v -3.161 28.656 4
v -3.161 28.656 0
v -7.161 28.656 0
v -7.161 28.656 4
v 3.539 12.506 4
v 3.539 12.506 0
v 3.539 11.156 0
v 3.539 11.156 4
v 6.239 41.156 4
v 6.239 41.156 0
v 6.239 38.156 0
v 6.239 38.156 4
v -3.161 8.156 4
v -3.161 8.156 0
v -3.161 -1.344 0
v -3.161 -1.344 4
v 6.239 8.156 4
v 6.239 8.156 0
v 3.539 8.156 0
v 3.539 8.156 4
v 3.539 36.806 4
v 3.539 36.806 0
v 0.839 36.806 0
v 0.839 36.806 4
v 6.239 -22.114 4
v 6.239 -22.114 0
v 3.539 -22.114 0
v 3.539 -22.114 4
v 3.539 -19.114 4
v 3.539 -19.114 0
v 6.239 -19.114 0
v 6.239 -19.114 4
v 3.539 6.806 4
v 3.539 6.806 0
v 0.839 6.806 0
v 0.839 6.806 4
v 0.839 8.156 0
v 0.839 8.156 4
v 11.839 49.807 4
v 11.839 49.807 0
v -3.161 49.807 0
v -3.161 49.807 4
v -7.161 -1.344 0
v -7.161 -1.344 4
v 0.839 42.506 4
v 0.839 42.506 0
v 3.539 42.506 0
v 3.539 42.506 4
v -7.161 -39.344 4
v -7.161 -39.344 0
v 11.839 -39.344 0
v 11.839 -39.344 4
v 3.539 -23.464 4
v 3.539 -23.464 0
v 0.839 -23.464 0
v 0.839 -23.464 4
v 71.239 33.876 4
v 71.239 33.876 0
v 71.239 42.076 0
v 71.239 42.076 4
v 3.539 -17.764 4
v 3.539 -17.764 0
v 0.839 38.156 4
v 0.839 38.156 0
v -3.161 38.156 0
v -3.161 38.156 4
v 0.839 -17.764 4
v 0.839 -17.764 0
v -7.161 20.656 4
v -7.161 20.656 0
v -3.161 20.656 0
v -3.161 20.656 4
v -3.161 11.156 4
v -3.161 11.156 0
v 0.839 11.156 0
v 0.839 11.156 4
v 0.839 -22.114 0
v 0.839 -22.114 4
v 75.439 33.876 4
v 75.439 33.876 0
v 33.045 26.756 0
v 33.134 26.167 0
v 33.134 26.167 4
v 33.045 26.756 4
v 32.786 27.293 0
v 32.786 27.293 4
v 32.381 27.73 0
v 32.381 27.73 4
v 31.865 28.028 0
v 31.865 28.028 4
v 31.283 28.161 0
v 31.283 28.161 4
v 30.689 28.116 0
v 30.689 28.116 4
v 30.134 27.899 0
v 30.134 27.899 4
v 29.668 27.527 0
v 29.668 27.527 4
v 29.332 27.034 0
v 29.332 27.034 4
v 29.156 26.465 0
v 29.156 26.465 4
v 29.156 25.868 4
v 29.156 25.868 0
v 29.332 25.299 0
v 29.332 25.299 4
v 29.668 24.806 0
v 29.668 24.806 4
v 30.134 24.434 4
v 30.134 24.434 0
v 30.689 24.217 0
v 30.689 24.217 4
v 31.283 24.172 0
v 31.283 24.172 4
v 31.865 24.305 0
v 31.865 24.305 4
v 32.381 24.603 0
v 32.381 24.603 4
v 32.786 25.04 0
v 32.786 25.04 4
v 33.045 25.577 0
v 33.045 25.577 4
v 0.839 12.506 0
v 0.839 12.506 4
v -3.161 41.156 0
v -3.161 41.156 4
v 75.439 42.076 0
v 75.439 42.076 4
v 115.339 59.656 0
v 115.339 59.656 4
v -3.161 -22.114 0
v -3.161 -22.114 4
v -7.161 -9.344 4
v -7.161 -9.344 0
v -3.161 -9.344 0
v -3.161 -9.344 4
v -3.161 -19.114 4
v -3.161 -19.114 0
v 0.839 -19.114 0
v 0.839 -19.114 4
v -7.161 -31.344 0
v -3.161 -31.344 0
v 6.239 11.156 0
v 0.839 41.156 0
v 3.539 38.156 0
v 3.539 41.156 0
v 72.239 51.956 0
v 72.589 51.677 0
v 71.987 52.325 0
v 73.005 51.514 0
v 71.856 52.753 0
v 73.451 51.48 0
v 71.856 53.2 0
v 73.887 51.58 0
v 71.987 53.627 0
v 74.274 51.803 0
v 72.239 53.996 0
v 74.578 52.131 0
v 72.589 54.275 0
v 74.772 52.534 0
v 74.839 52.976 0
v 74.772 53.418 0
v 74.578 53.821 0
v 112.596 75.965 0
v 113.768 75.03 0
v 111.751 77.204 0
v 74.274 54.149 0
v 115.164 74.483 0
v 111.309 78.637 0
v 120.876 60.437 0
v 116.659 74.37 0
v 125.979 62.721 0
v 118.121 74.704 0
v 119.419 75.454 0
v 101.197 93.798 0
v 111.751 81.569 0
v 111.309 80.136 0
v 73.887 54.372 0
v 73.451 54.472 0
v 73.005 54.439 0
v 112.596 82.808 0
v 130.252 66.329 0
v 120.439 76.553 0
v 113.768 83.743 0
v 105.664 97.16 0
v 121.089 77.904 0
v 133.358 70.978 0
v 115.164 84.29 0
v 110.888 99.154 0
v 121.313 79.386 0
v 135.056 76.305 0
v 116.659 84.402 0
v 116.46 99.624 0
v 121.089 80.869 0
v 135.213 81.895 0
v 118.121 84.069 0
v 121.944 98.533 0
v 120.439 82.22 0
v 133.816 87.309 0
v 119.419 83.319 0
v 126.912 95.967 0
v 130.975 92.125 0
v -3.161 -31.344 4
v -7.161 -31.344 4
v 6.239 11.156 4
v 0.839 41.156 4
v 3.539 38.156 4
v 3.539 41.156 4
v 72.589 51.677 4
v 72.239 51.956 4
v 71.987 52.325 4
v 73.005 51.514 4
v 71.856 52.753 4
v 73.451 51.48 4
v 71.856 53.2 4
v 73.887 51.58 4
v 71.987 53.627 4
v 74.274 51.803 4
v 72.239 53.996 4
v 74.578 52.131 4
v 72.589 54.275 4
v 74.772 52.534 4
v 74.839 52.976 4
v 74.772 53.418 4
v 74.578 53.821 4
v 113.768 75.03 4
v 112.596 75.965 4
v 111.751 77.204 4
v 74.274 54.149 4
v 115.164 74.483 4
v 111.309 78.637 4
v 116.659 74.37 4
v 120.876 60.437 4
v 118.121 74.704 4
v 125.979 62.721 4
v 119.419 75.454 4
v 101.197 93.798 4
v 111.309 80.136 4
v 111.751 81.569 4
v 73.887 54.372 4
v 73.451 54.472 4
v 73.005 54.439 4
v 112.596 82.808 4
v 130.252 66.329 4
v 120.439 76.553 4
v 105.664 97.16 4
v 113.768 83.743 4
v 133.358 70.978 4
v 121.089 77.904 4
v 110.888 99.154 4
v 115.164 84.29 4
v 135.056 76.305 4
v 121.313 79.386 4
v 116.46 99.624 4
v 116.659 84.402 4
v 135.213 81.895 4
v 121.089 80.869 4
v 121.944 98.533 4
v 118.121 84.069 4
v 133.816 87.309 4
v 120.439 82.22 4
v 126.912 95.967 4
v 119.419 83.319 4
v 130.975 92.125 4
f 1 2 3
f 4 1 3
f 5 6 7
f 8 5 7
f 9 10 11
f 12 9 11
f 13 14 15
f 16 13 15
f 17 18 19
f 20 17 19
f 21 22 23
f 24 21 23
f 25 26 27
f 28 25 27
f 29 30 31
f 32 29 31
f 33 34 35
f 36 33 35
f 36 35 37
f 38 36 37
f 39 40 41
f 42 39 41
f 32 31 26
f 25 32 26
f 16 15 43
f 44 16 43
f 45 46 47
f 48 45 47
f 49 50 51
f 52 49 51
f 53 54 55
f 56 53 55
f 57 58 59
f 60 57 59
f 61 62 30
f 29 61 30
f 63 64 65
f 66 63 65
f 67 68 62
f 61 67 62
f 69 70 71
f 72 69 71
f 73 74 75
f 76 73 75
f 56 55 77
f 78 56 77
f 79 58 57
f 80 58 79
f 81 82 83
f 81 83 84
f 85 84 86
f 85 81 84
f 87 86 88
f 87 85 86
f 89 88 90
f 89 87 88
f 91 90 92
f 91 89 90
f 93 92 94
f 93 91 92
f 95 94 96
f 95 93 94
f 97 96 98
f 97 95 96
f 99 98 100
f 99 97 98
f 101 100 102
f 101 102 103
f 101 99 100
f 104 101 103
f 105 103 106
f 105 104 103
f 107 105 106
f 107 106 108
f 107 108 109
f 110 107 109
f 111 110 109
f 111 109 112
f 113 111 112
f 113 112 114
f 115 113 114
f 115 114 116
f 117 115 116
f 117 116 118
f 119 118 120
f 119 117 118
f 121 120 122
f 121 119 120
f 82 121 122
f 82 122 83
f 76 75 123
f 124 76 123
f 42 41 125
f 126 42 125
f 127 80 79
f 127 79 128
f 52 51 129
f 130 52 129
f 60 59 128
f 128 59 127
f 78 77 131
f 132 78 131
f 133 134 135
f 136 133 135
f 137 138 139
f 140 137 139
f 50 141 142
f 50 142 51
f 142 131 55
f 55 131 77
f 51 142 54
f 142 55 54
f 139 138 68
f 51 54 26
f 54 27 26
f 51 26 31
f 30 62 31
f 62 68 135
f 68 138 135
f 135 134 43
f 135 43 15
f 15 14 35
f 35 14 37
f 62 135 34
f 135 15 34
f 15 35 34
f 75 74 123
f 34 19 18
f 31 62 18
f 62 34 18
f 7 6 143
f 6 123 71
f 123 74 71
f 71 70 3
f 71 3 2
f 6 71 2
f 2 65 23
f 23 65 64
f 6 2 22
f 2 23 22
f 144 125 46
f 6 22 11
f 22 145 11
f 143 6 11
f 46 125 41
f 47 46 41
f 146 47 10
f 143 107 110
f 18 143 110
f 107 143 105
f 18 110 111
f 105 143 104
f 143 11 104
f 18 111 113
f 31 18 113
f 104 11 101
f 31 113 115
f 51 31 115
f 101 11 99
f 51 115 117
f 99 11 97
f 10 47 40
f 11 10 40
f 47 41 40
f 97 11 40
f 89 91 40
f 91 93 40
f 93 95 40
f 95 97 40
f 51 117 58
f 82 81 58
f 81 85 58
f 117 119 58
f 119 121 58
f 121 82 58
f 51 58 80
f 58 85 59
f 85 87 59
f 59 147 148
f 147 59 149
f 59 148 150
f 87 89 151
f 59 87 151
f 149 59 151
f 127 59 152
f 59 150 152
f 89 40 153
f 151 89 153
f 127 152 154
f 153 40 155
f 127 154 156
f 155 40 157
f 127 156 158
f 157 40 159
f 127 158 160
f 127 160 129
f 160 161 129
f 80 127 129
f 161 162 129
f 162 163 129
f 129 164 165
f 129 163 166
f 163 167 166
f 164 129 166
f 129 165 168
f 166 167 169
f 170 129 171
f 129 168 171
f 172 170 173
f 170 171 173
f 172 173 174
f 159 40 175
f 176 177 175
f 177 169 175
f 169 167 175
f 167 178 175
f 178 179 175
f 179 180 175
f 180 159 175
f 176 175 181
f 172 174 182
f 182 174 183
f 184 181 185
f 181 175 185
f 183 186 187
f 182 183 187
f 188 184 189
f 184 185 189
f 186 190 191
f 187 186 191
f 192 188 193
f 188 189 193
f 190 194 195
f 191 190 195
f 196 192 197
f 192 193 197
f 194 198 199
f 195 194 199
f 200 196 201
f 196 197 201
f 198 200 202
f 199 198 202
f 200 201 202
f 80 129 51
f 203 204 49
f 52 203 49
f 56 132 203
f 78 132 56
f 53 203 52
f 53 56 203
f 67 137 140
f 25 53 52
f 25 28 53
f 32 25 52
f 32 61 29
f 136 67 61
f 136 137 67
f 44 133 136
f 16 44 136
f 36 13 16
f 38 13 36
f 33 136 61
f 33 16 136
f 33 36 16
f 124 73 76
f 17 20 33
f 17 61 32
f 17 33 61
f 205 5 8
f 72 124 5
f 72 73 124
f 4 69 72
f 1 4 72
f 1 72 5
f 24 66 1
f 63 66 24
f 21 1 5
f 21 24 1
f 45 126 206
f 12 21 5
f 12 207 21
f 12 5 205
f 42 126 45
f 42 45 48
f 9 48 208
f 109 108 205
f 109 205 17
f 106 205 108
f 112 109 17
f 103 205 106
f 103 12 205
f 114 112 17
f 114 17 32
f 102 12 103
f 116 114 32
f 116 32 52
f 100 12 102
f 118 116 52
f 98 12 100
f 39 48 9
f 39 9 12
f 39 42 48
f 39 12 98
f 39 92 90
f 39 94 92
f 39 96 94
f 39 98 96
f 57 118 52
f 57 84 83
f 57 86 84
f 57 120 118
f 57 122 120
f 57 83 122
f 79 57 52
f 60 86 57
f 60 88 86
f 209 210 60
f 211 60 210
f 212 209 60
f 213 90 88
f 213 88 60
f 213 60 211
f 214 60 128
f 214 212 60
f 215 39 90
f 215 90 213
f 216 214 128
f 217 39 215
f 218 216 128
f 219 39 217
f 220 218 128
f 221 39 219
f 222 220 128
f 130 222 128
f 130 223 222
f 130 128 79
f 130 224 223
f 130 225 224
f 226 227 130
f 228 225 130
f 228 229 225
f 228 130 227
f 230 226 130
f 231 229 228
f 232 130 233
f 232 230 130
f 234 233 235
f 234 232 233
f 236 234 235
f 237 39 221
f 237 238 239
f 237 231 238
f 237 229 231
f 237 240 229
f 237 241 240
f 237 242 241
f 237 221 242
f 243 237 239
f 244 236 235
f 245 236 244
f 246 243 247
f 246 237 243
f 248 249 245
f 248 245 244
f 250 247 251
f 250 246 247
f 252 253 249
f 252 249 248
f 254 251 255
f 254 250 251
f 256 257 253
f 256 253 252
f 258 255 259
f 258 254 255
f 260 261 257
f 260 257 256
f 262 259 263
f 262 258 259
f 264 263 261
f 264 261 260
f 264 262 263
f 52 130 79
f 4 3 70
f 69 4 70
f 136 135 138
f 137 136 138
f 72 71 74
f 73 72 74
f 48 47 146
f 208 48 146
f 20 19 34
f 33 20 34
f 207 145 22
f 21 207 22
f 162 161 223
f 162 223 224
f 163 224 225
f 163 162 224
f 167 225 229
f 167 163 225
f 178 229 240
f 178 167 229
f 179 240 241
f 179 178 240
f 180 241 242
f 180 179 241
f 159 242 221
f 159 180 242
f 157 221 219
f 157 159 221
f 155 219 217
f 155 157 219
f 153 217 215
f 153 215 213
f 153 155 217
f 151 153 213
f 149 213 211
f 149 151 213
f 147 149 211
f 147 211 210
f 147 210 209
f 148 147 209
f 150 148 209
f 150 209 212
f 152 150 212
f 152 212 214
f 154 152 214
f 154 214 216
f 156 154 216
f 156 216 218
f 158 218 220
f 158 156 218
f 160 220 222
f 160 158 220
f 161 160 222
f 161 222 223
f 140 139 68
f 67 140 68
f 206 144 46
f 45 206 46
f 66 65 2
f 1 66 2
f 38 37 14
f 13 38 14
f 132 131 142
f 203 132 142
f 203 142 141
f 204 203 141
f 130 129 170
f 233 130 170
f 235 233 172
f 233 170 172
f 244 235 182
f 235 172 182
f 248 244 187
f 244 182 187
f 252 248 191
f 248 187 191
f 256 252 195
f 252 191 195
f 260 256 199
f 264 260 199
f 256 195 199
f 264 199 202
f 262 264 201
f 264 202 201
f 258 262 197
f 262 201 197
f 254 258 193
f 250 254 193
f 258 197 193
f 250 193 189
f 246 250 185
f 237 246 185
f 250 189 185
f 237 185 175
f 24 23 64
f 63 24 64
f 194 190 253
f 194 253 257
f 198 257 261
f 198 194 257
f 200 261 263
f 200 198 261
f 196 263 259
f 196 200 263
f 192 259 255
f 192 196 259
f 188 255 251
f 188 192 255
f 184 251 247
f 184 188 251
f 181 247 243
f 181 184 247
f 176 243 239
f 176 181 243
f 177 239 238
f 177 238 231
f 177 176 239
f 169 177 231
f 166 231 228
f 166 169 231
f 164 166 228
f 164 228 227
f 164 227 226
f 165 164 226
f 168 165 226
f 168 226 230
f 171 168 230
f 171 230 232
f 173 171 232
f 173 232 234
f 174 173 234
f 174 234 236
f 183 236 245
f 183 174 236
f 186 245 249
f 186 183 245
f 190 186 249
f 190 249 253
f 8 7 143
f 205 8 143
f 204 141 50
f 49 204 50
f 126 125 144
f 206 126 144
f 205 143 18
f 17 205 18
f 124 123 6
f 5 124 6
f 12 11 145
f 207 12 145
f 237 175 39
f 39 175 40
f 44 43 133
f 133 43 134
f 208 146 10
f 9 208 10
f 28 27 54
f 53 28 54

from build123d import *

# Parameters (mm, degrees)
SKETCH_1_R      = 2
SKETCH_1_W      = 4.2
SKETCH_1_H      = 8.2
SKETCH_1_R_2    = 1.5
SKETCH_1_R_3    = 5.03
EXTRUDE_1_DEPTH = 4


with BuildPart() as part:
    # 草图1 → 凸台-拉伸1 (new body)
    with BuildSketch(Plane.XY):
        with BuildLine():
            Line((0.838796757, -22.113571429), (-3.161203243, -22.113571429))
            Line((-3.161203243, -22.113571429), (-3.161203243, -31.344407284))
            Line((-3.161203243, -31.344407284), (-7.161203243, -31.344407284))
            Line((-7.161203243, -31.344407284), (-7.161203243, -39.344407284))
            Line((-7.161203243, -39.344407284), (-3.161203243, -39.344407284))
            Line((-3.161203243, -39.344407284), (11.838796757, -39.344407284))
            Line((11.838796757, -39.344407284), (115.338796757, 59.655592716))
            ThreePointArc((115.338796757, 59.655592716), (133.816387407, 87.309261363), (101.196661133, 93.797728339))
            Line((101.196661133, 93.797728339), (11.838796757, 49.807248516))
            Line((11.838796757, 49.807248516), (-3.161203243, 49.807248516))
            Line((-3.161203243, 49.807248516), (-3.161203243, 41.155592716))
            Line((-3.161203243, 41.155592716), (0.838796757, 41.155592716))
            Line((0.838796757, 41.155592716), (0.838796757, 42.505592716))
            Line((0.838796757, 42.505592716), (3.538796757, 42.505592716))
            Line((3.538796757, 42.505592716), (3.538796757, 41.155592716))
            Line((3.538796757, 41.155592716), (6.238796757, 41.155592716))
            Line((6.238796757, 41.155592716), (6.238796757, 38.155592716))
            Line((6.238796757, 38.155592716), (3.538796757, 38.155592716))
            Line((3.538796757, 38.155592716), (3.538796757, 36.805592716))
            Line((3.538796757, 36.805592716), (0.838796757, 36.805592716))
            Line((0.838796757, 36.805592716), (0.838796757, 38.155592716))
            Line((0.838796757, 38.155592716), (-3.161203243, 38.155592716))
            Line((-3.161203243, 38.155592716), (-3.161203243, 28.655592716))
            Line((-3.161203243, 28.655592716), (-7.161203243, 28.655592716))
            Line((-7.161203243, 28.655592716), (-7.161203243, 20.655592716))
            Line((-7.161203243, 20.655592716), (-3.161203243, 20.655592716))
            Line((-3.161203243, 20.655592716), (-3.161203243, 11.155592716))
            Line((-3.161203243, 11.155592716), (0.838796757, 11.155592716))
            Line((0.838796757, 11.155592716), (0.838796757, 12.505592716))
            Line((0.838796757, 12.505592716), (3.538796757, 12.505592716))
            Line((3.538796757, 12.505592716), (3.538796757, 11.155592716))
            Line((3.538796757, 11.155592716), (6.238796757, 11.155592716))
            Line((6.238796757, 11.155592716), (6.238796757, 8.155592716))
            Line((6.238796757, 8.155592716), (3.538796757, 8.155592716))
            Line((3.538796757, 8.155592716), (3.538796757, 6.805592716))
            Line((3.538796757, 6.805592716), (0.838796757, 6.805592716))
            Line((0.838796757, 6.805592716), (0.838796757, 8.155592716))
            Line((0.838796757, 8.155592716), (-3.161203243, 8.155592716))
            Line((-3.161203243, 8.155592716), (-3.161203243, -1.344407284))
            Line((-3.161203243, -1.344407284), (-7.161203243, -1.344407284))
            Line((-7.161203243, -1.344407284), (-7.161203243, -9.344407284))
            Line((-7.161203243, -9.344407284), (-3.161203243, -9.344407284))
            Line((-3.161203243, -9.344407284), (-3.161203243, -19.113571429))
            Line((-3.161203243, -19.113571429), (0.838796757, -19.113571429))
            Line((0.838796757, -19.113571429), (0.838796757, -17.763571429))
            Line((0.838796757, -17.763571429), (3.538796757, -17.763571429))
            Line((3.538796757, -17.763571429), (3.538796757, -19.113571429))
            Line((3.538796757, -19.113571429), (6.238796757, -19.113571429))
            Line((6.238796757, -19.113571429), (6.238796757, -22.113571429))
            Line((6.238796757, -22.113571429), (3.538796757, -22.113571429))
            Line((3.538796757, -22.113571429), (3.538796757, -23.463571429))
            Line((3.538796757, -23.463571429), (0.838796757, -23.463571429))
            Line((0.838796757, -23.463571429), (0.838796757, -22.113571429))
        make_face()
        with Locations((31.133984923, 26.166524095)):
            Circle(SKETCH_1_R, mode=Mode.SUBTRACT)
        with Locations((73.338796757, 37.976109285)):
            Rectangle(SKETCH_1_W, SKETCH_1_H, mode=Mode.SUBTRACT)
        with Locations((73.338796757, 52.976109285)):
            Circle(SKETCH_1_R_2, mode=Mode.SUBTRACT)
        with Locations((116.282857143, 79.386428571)):
            Circle(SKETCH_1_R_3, mode=Mode.SUBTRACT)
    extrude(amount=EXTRUDE_1_DEPTH)


solid = part.part
